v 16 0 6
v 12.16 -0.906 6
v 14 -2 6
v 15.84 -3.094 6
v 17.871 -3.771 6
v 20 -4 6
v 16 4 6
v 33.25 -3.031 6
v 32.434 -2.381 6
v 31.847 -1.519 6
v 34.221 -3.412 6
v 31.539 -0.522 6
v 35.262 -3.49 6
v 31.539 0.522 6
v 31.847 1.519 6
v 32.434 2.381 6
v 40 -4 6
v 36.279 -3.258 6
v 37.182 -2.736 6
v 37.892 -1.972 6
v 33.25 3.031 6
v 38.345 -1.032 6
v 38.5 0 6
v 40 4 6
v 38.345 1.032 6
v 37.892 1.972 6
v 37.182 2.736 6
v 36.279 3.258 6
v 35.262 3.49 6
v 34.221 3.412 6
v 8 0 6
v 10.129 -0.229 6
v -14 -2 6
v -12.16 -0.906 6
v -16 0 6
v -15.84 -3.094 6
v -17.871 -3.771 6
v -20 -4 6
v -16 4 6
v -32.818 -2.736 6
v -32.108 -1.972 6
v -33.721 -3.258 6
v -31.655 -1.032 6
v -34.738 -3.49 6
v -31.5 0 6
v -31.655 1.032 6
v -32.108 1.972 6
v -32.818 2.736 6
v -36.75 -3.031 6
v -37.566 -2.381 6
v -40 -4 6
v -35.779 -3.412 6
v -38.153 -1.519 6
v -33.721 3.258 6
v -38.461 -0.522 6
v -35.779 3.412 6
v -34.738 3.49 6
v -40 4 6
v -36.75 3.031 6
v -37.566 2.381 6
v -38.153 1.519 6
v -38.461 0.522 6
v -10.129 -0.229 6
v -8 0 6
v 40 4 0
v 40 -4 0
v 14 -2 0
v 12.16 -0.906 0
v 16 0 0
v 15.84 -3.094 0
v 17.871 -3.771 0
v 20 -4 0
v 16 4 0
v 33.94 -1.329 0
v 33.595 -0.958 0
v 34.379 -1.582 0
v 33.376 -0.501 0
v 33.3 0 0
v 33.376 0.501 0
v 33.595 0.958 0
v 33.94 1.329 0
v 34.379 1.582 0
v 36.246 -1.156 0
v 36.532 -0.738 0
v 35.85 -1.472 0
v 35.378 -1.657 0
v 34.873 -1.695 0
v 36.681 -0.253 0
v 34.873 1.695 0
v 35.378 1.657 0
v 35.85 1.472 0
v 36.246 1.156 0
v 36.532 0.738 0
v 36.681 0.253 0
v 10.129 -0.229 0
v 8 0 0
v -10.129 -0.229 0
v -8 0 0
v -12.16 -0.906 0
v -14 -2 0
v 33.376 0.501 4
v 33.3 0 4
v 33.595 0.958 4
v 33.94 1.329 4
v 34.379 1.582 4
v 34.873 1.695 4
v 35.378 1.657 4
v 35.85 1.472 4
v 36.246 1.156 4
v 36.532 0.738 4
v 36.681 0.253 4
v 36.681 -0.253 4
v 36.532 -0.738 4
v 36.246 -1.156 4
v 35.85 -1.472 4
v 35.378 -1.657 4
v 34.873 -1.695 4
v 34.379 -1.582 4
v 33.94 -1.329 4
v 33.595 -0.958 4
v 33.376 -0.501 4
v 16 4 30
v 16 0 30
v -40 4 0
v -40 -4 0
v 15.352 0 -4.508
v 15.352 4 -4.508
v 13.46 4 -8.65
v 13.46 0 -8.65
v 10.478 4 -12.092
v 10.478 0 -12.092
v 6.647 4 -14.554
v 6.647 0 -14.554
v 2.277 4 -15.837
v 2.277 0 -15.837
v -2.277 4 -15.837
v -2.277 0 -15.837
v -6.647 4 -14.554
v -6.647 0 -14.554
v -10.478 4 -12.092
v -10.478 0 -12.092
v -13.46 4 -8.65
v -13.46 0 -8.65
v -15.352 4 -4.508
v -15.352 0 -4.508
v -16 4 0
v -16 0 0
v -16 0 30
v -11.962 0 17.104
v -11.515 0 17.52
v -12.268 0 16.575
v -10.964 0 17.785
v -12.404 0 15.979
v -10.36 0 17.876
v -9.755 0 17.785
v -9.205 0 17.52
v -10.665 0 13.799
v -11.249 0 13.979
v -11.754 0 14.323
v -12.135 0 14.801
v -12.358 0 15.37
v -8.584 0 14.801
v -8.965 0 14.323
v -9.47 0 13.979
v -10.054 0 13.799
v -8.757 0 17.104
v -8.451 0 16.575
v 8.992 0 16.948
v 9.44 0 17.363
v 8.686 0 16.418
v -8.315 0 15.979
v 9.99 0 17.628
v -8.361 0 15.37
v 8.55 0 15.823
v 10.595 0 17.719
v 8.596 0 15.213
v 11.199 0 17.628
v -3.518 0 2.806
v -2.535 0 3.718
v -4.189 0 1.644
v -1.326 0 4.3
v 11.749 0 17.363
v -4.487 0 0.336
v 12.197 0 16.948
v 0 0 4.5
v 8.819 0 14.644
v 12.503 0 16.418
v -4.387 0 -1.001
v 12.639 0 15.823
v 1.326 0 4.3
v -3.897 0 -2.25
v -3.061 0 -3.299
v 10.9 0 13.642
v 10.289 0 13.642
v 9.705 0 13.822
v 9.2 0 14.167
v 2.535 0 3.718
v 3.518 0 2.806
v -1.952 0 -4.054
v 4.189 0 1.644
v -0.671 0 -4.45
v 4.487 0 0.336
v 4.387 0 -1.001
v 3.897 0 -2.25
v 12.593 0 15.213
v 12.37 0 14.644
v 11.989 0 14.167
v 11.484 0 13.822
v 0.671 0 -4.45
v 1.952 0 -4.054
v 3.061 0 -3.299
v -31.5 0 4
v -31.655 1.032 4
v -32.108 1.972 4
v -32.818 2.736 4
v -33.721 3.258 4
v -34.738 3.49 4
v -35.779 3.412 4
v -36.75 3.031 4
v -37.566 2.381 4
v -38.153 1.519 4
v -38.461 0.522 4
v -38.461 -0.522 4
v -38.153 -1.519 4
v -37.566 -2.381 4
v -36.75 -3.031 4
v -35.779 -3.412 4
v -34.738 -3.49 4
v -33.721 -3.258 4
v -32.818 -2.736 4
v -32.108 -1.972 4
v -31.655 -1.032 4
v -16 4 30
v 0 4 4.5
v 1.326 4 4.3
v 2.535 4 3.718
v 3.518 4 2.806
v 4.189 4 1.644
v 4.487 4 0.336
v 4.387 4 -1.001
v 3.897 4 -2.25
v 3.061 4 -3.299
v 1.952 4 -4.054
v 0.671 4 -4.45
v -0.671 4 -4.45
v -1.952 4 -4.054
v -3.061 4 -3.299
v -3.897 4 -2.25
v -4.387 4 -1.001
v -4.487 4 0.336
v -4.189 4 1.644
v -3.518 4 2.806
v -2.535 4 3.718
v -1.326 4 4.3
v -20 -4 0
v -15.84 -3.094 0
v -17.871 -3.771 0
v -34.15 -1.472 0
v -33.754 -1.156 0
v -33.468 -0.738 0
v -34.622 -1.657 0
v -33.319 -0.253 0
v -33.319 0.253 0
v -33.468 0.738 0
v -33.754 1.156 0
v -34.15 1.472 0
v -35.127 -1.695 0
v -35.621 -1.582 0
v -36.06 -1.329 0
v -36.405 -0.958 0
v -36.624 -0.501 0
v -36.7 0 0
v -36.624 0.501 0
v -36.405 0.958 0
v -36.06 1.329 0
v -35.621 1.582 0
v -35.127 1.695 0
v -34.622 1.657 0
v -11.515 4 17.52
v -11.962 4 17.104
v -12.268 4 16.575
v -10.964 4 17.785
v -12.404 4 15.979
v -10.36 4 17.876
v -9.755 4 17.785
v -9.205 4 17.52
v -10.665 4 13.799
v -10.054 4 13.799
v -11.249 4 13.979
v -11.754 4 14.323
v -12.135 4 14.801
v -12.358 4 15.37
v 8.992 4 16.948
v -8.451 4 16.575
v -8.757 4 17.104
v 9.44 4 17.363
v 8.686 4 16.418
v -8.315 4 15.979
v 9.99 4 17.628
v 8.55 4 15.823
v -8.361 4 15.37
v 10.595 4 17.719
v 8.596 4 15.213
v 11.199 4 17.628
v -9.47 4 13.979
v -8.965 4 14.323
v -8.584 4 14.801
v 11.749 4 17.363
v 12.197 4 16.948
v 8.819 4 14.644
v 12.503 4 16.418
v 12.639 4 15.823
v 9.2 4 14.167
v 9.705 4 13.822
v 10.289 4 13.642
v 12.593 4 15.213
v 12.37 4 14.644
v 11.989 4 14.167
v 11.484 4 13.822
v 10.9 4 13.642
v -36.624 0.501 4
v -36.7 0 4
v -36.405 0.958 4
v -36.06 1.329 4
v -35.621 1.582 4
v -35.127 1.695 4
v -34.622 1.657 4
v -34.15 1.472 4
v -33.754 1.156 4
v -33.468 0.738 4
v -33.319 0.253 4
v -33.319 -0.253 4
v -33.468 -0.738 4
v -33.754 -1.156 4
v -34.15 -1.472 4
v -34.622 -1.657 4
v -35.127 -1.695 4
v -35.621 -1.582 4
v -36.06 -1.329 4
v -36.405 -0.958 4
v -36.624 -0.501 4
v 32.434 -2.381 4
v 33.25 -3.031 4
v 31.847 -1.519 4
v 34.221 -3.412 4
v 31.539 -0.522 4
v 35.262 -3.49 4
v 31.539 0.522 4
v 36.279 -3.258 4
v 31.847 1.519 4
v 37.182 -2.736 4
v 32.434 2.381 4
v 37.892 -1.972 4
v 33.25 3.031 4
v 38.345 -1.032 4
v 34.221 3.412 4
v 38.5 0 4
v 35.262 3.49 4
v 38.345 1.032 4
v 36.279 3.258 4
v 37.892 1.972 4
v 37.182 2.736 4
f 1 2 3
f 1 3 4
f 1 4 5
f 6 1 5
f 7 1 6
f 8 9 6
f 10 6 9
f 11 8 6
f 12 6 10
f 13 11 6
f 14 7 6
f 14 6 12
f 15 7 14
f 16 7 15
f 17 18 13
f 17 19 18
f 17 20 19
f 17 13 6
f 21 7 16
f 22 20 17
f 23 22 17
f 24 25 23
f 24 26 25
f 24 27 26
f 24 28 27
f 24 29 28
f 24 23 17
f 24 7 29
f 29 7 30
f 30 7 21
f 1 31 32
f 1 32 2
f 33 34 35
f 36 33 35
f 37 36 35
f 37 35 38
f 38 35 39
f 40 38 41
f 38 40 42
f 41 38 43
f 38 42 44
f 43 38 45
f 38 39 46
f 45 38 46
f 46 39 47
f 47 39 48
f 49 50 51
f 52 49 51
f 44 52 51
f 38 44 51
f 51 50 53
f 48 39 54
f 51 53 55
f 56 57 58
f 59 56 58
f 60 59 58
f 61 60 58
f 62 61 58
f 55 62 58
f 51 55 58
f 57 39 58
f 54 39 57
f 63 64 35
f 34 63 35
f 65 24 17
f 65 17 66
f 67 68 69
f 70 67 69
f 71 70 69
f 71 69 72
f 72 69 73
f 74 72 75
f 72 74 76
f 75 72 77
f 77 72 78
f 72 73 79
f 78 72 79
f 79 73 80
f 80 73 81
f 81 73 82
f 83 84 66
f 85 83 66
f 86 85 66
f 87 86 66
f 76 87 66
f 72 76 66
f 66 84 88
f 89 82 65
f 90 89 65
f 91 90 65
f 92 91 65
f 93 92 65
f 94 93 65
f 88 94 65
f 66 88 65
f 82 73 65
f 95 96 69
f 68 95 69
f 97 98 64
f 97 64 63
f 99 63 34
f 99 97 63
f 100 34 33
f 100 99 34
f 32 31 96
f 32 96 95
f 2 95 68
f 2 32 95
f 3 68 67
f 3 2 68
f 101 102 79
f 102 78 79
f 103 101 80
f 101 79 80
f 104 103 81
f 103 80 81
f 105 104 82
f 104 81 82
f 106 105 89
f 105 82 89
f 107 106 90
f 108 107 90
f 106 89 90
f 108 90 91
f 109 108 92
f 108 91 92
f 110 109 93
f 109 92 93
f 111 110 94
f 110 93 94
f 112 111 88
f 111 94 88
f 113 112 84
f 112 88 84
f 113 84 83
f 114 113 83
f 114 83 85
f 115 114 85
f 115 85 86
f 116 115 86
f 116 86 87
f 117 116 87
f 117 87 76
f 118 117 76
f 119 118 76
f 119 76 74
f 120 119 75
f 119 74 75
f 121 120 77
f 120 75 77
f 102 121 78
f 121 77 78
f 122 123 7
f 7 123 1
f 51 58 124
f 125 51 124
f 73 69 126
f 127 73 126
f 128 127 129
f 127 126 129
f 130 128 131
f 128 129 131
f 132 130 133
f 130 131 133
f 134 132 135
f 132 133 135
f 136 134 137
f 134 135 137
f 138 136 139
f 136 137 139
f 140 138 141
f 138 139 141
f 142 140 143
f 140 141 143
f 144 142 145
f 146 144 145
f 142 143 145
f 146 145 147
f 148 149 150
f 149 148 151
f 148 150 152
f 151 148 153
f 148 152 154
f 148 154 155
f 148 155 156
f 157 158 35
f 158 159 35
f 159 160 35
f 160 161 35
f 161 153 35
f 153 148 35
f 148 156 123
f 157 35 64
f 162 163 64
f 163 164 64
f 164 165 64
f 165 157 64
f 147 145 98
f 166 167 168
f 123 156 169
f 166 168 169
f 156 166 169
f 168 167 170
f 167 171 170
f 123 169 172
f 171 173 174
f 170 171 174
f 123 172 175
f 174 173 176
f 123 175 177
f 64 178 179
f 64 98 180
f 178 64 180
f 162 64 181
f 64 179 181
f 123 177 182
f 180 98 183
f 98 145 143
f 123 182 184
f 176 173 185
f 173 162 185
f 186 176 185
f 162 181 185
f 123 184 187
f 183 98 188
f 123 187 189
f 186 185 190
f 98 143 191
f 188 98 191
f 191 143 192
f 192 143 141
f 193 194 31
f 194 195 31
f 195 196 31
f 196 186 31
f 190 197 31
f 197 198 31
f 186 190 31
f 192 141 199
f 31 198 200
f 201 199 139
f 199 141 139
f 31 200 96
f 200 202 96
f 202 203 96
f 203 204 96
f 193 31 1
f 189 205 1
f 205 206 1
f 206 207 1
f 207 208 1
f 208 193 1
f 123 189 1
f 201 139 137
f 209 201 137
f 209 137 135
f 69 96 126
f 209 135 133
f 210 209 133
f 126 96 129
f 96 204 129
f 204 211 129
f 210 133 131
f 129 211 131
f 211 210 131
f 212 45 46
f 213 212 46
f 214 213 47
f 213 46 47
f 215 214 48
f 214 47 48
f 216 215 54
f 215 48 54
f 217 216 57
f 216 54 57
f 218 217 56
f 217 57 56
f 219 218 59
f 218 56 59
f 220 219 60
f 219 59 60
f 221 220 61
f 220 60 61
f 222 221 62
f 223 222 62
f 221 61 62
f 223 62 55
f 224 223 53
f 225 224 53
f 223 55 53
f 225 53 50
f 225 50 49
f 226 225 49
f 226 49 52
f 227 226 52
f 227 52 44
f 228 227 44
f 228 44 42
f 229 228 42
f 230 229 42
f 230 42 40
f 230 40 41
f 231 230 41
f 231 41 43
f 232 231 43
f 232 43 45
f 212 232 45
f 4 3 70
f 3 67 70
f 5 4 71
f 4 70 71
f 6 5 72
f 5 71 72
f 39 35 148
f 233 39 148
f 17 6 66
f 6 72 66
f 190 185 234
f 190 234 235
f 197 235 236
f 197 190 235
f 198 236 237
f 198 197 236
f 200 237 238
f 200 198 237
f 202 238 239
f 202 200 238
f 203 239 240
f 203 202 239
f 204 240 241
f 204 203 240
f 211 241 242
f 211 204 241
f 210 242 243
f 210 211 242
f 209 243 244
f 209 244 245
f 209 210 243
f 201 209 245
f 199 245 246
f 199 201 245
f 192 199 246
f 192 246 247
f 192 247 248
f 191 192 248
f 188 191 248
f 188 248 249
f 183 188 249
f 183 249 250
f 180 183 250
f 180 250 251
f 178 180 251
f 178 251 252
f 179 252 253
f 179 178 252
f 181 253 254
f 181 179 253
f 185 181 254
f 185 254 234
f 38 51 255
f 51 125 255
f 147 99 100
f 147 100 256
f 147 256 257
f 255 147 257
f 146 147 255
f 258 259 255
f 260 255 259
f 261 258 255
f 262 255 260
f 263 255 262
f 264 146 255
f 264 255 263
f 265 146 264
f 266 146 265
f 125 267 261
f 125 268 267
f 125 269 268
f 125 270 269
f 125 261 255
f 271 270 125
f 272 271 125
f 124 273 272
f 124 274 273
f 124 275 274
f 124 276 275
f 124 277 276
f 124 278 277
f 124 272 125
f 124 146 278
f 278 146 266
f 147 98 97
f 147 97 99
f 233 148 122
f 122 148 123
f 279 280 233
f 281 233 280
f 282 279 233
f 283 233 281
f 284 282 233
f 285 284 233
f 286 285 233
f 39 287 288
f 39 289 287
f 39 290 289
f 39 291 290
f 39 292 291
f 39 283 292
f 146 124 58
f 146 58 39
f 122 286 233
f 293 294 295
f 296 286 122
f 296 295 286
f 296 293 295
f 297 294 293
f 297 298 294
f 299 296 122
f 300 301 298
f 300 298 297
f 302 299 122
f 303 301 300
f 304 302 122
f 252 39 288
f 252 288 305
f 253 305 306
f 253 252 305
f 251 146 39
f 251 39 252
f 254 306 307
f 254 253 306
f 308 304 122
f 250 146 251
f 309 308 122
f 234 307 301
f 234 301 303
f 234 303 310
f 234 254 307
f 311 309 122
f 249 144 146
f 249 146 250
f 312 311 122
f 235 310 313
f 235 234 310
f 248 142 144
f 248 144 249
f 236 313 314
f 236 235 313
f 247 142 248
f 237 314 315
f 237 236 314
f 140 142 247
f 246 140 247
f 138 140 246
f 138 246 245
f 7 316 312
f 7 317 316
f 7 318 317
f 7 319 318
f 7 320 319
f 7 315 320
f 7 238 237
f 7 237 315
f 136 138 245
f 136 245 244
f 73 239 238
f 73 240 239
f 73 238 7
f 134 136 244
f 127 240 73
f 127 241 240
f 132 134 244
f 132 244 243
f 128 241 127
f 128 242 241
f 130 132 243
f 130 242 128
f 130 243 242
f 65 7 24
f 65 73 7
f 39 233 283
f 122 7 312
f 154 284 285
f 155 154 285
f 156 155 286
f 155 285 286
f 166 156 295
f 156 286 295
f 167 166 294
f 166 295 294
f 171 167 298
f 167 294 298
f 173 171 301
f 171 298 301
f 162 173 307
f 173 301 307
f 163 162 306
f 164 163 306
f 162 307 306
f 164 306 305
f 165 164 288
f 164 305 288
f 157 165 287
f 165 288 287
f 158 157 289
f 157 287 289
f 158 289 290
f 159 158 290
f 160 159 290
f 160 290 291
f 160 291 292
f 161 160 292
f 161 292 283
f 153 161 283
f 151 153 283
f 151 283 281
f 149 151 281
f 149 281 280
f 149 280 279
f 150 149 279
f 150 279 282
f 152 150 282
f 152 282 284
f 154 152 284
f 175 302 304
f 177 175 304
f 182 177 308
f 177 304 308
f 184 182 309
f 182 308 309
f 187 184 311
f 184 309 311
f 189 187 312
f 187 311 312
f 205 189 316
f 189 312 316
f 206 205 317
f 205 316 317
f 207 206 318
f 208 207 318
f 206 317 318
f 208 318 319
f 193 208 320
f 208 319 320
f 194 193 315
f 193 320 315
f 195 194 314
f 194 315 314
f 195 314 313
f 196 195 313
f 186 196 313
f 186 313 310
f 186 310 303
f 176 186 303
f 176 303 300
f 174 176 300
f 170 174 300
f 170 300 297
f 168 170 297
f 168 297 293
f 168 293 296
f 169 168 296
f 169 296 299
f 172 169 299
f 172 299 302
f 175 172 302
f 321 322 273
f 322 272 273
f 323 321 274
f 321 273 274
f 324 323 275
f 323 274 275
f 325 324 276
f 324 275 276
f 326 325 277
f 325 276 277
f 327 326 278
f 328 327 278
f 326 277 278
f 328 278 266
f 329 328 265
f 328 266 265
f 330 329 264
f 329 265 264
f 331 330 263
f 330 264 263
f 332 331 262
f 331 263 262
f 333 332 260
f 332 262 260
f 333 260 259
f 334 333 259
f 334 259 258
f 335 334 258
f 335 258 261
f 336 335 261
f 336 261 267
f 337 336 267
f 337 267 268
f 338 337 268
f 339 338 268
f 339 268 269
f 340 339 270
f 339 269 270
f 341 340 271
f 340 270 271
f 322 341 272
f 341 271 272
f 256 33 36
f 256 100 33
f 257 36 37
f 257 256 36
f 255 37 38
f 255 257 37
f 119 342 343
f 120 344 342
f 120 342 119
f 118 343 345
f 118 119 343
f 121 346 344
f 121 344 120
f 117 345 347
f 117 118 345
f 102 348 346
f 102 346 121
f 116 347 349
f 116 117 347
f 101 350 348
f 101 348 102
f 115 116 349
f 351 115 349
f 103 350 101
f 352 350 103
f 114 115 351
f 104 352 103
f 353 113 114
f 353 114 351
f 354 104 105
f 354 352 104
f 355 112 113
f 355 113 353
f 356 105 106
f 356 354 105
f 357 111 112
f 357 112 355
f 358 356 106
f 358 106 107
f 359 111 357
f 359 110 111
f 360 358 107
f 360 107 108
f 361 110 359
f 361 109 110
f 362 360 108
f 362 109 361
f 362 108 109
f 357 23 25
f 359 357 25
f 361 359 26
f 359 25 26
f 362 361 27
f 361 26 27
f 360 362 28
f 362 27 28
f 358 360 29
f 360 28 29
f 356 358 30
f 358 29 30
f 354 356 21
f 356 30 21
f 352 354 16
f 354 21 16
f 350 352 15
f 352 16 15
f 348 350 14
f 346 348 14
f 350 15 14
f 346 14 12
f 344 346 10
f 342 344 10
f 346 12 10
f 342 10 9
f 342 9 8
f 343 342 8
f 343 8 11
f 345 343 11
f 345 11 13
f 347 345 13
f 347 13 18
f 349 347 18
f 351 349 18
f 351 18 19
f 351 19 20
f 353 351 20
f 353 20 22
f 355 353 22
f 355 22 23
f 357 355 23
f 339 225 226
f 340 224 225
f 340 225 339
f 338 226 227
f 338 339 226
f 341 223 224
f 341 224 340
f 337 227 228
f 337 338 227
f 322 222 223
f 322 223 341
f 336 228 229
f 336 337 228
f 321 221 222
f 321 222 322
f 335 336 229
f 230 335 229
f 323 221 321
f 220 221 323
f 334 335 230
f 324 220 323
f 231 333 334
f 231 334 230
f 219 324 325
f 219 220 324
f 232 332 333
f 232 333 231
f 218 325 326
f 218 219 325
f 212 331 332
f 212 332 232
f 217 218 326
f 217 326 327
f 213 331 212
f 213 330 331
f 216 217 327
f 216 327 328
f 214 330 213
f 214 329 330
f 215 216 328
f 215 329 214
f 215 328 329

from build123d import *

# Parameters (mm, degrees)
SKETCH1_R                                            = 4.5
BOSS_EXTRUDE1_DEPTH                                  = 4
SKETCH2_W                                            = 24
SKETCH2_H                                            = 6
BOSS_EXTRUDE2_DEPTH                                  = 8
CBORE_FOR_M3_HEXAGON_HEAD_BOLTS_FULL_THR_D           = 3.4
CBORE_FOR_M3_HEXAGON_HEAD_BOLTS_FULL_THR_CBORE_D     = 7
CBORE_FOR_M3_HEXAGON_HEAD_BOLTS_FULL_THR_CBORE_DEPTH = 2
FILLET1_R                                            = 10
FILLET2_R                                            = 10
SKETCH4_R                                            = 2.05
SKETCH4_R_2                                          = 1.9812
CUT_EXTRUDE2_DEPTH                                   = 51.635955605


with BuildPart() as part:
    # Sketch1 → Boss-Extrude1 (new body)
    with BuildSketch(Plane(origin=(0, 0, 0), x_dir=(1, 0, 0), z_dir=(0, 1, 0))):
        with BuildLine():
            Line((-16, 0), (-16, -30))
            Line((-16, -30), (16, -30))
            Line((16, -30), (16, 0))
            ThreePointArc((16, 0), (0, 16), (-16, 0))
        make_face()
        with Locations(Location((0, 0, 0), (0, 0, 270))):
            Circle(SKETCH1_R, mode=Mode.SUBTRACT)
    extrude(amount=BOSS_EXTRUDE1_DEPTH)

    # Sketch2 → Boss-Extrude2 (add)
    with BuildSketch(Plane(origin=(0, 4, 0), x_dir=(1, 0, 0), z_dir=(0, 1, 0))):
        with Locations((28, -3)):
            Rectangle(SKETCH2_W, SKETCH2_H)
        with Locations((-28, -3)):
            Rectangle(SKETCH2_W, SKETCH2_H)
    extrude(amount=-BOSS_EXTRUDE2_DEPTH)

    # CBORE for M3 Hexagon head bolts-Full thread-grades AB1 (through all)
    with Locations(Plane(origin=(-35, 0, 6), x_dir=(1, 0, 0), z_dir=(0, 0, 1))):
        with Locations((0, 0), (70, 0)):
            CounterBoreHole(CBORE_FOR_M3_HEXAGON_HEAD_BOLTS_FULL_THR_D / 2, CBORE_FOR_M3_HEXAGON_HEAD_BOLTS_FULL_THR_CBORE_D / 2, CBORE_FOR_M3_HEXAGON_HEAD_BOLTS_FULL_THR_CBORE_DEPTH)

    # Fillet1
    # the kernel refuses this fillet: 10 mm, written as the material it adds along each edge
    with BuildSketch(Plane(origin=(16, 0, 6), x_dir=(-1, 0, 0), z_dir=(0, 0, -1)), Plane(origin=(-16, 0, 0), x_dir=(1, 0, 0), z_dir=(0, 0, 1))) as fillet1_piece_1:
        with BuildLine():
            CenterArc((8, -10), FILLET1_R, 90, 53.130102354)
            Line((0, -4), (0, 0))
            Line((0, 0), (8, 0))
        make_face()
    extrude(amount=6)

    # Fillet2
    fillet2_edges = [part.edges().sort_by_distance(p)[0] for p in [
        (16, -4, 3),
        (-16, -4, 3),
    ]]
    fillet(fillet2_edges, radius=FILLET2_R)

    # Sketch4 → Cut-Extrude2 (cut, through all)
    # profile 1 of 4: a face of its own
    with BuildSketch(Plane(origin=(0, 4, 0), x_dir=(1, 0, 0), z_dir=(0, 1, 0))):
        with Locations(Location((-10.359727729, -15.825724364, 0), (0, 0, 270))):
            Circle(SKETCH4_R)
        with Locations((-10.359727729, -15.825724364)):
            Circle(SKETCH4_R_2, mode=Mode.SUBTRACT)
    # profile 2 of 4: a face of its own
    with BuildSketch(Plane(origin=(0, 4, 0), x_dir=(1, 0, 0), z_dir=(0, 1, 0))):
        with Locations((-10.359727729, -15.825724364)):
            Circle(SKETCH4_R_2)
    # profile 3 of 4: a face of its own
    with BuildSketch(Plane(origin=(0, 4, 0), x_dir=(1, 0, 0), z_dir=(0, 1, 0))):
        with Locations(Location((10.594689167, -15.669399213, 0), (0, 0, 270))):
            Circle(SKETCH4_R)
        with Locations((10.594689167, -15.669399213)):
            Circle(SKETCH4_R_2, mode=Mode.SUBTRACT)
    # profile 4 of 4: a face of its own
    with BuildSketch(Plane(origin=(0, 4, 0), x_dir=(1, 0, 0), z_dir=(0, 1, 0))):
        with Locations((10.594689167, -15.669399213)):
            Circle(SKETCH4_R_2)
    extrude(amount=-CUT_EXTRUDE2_DEPTH, mode=Mode.SUBTRACT)


solid = part.part
